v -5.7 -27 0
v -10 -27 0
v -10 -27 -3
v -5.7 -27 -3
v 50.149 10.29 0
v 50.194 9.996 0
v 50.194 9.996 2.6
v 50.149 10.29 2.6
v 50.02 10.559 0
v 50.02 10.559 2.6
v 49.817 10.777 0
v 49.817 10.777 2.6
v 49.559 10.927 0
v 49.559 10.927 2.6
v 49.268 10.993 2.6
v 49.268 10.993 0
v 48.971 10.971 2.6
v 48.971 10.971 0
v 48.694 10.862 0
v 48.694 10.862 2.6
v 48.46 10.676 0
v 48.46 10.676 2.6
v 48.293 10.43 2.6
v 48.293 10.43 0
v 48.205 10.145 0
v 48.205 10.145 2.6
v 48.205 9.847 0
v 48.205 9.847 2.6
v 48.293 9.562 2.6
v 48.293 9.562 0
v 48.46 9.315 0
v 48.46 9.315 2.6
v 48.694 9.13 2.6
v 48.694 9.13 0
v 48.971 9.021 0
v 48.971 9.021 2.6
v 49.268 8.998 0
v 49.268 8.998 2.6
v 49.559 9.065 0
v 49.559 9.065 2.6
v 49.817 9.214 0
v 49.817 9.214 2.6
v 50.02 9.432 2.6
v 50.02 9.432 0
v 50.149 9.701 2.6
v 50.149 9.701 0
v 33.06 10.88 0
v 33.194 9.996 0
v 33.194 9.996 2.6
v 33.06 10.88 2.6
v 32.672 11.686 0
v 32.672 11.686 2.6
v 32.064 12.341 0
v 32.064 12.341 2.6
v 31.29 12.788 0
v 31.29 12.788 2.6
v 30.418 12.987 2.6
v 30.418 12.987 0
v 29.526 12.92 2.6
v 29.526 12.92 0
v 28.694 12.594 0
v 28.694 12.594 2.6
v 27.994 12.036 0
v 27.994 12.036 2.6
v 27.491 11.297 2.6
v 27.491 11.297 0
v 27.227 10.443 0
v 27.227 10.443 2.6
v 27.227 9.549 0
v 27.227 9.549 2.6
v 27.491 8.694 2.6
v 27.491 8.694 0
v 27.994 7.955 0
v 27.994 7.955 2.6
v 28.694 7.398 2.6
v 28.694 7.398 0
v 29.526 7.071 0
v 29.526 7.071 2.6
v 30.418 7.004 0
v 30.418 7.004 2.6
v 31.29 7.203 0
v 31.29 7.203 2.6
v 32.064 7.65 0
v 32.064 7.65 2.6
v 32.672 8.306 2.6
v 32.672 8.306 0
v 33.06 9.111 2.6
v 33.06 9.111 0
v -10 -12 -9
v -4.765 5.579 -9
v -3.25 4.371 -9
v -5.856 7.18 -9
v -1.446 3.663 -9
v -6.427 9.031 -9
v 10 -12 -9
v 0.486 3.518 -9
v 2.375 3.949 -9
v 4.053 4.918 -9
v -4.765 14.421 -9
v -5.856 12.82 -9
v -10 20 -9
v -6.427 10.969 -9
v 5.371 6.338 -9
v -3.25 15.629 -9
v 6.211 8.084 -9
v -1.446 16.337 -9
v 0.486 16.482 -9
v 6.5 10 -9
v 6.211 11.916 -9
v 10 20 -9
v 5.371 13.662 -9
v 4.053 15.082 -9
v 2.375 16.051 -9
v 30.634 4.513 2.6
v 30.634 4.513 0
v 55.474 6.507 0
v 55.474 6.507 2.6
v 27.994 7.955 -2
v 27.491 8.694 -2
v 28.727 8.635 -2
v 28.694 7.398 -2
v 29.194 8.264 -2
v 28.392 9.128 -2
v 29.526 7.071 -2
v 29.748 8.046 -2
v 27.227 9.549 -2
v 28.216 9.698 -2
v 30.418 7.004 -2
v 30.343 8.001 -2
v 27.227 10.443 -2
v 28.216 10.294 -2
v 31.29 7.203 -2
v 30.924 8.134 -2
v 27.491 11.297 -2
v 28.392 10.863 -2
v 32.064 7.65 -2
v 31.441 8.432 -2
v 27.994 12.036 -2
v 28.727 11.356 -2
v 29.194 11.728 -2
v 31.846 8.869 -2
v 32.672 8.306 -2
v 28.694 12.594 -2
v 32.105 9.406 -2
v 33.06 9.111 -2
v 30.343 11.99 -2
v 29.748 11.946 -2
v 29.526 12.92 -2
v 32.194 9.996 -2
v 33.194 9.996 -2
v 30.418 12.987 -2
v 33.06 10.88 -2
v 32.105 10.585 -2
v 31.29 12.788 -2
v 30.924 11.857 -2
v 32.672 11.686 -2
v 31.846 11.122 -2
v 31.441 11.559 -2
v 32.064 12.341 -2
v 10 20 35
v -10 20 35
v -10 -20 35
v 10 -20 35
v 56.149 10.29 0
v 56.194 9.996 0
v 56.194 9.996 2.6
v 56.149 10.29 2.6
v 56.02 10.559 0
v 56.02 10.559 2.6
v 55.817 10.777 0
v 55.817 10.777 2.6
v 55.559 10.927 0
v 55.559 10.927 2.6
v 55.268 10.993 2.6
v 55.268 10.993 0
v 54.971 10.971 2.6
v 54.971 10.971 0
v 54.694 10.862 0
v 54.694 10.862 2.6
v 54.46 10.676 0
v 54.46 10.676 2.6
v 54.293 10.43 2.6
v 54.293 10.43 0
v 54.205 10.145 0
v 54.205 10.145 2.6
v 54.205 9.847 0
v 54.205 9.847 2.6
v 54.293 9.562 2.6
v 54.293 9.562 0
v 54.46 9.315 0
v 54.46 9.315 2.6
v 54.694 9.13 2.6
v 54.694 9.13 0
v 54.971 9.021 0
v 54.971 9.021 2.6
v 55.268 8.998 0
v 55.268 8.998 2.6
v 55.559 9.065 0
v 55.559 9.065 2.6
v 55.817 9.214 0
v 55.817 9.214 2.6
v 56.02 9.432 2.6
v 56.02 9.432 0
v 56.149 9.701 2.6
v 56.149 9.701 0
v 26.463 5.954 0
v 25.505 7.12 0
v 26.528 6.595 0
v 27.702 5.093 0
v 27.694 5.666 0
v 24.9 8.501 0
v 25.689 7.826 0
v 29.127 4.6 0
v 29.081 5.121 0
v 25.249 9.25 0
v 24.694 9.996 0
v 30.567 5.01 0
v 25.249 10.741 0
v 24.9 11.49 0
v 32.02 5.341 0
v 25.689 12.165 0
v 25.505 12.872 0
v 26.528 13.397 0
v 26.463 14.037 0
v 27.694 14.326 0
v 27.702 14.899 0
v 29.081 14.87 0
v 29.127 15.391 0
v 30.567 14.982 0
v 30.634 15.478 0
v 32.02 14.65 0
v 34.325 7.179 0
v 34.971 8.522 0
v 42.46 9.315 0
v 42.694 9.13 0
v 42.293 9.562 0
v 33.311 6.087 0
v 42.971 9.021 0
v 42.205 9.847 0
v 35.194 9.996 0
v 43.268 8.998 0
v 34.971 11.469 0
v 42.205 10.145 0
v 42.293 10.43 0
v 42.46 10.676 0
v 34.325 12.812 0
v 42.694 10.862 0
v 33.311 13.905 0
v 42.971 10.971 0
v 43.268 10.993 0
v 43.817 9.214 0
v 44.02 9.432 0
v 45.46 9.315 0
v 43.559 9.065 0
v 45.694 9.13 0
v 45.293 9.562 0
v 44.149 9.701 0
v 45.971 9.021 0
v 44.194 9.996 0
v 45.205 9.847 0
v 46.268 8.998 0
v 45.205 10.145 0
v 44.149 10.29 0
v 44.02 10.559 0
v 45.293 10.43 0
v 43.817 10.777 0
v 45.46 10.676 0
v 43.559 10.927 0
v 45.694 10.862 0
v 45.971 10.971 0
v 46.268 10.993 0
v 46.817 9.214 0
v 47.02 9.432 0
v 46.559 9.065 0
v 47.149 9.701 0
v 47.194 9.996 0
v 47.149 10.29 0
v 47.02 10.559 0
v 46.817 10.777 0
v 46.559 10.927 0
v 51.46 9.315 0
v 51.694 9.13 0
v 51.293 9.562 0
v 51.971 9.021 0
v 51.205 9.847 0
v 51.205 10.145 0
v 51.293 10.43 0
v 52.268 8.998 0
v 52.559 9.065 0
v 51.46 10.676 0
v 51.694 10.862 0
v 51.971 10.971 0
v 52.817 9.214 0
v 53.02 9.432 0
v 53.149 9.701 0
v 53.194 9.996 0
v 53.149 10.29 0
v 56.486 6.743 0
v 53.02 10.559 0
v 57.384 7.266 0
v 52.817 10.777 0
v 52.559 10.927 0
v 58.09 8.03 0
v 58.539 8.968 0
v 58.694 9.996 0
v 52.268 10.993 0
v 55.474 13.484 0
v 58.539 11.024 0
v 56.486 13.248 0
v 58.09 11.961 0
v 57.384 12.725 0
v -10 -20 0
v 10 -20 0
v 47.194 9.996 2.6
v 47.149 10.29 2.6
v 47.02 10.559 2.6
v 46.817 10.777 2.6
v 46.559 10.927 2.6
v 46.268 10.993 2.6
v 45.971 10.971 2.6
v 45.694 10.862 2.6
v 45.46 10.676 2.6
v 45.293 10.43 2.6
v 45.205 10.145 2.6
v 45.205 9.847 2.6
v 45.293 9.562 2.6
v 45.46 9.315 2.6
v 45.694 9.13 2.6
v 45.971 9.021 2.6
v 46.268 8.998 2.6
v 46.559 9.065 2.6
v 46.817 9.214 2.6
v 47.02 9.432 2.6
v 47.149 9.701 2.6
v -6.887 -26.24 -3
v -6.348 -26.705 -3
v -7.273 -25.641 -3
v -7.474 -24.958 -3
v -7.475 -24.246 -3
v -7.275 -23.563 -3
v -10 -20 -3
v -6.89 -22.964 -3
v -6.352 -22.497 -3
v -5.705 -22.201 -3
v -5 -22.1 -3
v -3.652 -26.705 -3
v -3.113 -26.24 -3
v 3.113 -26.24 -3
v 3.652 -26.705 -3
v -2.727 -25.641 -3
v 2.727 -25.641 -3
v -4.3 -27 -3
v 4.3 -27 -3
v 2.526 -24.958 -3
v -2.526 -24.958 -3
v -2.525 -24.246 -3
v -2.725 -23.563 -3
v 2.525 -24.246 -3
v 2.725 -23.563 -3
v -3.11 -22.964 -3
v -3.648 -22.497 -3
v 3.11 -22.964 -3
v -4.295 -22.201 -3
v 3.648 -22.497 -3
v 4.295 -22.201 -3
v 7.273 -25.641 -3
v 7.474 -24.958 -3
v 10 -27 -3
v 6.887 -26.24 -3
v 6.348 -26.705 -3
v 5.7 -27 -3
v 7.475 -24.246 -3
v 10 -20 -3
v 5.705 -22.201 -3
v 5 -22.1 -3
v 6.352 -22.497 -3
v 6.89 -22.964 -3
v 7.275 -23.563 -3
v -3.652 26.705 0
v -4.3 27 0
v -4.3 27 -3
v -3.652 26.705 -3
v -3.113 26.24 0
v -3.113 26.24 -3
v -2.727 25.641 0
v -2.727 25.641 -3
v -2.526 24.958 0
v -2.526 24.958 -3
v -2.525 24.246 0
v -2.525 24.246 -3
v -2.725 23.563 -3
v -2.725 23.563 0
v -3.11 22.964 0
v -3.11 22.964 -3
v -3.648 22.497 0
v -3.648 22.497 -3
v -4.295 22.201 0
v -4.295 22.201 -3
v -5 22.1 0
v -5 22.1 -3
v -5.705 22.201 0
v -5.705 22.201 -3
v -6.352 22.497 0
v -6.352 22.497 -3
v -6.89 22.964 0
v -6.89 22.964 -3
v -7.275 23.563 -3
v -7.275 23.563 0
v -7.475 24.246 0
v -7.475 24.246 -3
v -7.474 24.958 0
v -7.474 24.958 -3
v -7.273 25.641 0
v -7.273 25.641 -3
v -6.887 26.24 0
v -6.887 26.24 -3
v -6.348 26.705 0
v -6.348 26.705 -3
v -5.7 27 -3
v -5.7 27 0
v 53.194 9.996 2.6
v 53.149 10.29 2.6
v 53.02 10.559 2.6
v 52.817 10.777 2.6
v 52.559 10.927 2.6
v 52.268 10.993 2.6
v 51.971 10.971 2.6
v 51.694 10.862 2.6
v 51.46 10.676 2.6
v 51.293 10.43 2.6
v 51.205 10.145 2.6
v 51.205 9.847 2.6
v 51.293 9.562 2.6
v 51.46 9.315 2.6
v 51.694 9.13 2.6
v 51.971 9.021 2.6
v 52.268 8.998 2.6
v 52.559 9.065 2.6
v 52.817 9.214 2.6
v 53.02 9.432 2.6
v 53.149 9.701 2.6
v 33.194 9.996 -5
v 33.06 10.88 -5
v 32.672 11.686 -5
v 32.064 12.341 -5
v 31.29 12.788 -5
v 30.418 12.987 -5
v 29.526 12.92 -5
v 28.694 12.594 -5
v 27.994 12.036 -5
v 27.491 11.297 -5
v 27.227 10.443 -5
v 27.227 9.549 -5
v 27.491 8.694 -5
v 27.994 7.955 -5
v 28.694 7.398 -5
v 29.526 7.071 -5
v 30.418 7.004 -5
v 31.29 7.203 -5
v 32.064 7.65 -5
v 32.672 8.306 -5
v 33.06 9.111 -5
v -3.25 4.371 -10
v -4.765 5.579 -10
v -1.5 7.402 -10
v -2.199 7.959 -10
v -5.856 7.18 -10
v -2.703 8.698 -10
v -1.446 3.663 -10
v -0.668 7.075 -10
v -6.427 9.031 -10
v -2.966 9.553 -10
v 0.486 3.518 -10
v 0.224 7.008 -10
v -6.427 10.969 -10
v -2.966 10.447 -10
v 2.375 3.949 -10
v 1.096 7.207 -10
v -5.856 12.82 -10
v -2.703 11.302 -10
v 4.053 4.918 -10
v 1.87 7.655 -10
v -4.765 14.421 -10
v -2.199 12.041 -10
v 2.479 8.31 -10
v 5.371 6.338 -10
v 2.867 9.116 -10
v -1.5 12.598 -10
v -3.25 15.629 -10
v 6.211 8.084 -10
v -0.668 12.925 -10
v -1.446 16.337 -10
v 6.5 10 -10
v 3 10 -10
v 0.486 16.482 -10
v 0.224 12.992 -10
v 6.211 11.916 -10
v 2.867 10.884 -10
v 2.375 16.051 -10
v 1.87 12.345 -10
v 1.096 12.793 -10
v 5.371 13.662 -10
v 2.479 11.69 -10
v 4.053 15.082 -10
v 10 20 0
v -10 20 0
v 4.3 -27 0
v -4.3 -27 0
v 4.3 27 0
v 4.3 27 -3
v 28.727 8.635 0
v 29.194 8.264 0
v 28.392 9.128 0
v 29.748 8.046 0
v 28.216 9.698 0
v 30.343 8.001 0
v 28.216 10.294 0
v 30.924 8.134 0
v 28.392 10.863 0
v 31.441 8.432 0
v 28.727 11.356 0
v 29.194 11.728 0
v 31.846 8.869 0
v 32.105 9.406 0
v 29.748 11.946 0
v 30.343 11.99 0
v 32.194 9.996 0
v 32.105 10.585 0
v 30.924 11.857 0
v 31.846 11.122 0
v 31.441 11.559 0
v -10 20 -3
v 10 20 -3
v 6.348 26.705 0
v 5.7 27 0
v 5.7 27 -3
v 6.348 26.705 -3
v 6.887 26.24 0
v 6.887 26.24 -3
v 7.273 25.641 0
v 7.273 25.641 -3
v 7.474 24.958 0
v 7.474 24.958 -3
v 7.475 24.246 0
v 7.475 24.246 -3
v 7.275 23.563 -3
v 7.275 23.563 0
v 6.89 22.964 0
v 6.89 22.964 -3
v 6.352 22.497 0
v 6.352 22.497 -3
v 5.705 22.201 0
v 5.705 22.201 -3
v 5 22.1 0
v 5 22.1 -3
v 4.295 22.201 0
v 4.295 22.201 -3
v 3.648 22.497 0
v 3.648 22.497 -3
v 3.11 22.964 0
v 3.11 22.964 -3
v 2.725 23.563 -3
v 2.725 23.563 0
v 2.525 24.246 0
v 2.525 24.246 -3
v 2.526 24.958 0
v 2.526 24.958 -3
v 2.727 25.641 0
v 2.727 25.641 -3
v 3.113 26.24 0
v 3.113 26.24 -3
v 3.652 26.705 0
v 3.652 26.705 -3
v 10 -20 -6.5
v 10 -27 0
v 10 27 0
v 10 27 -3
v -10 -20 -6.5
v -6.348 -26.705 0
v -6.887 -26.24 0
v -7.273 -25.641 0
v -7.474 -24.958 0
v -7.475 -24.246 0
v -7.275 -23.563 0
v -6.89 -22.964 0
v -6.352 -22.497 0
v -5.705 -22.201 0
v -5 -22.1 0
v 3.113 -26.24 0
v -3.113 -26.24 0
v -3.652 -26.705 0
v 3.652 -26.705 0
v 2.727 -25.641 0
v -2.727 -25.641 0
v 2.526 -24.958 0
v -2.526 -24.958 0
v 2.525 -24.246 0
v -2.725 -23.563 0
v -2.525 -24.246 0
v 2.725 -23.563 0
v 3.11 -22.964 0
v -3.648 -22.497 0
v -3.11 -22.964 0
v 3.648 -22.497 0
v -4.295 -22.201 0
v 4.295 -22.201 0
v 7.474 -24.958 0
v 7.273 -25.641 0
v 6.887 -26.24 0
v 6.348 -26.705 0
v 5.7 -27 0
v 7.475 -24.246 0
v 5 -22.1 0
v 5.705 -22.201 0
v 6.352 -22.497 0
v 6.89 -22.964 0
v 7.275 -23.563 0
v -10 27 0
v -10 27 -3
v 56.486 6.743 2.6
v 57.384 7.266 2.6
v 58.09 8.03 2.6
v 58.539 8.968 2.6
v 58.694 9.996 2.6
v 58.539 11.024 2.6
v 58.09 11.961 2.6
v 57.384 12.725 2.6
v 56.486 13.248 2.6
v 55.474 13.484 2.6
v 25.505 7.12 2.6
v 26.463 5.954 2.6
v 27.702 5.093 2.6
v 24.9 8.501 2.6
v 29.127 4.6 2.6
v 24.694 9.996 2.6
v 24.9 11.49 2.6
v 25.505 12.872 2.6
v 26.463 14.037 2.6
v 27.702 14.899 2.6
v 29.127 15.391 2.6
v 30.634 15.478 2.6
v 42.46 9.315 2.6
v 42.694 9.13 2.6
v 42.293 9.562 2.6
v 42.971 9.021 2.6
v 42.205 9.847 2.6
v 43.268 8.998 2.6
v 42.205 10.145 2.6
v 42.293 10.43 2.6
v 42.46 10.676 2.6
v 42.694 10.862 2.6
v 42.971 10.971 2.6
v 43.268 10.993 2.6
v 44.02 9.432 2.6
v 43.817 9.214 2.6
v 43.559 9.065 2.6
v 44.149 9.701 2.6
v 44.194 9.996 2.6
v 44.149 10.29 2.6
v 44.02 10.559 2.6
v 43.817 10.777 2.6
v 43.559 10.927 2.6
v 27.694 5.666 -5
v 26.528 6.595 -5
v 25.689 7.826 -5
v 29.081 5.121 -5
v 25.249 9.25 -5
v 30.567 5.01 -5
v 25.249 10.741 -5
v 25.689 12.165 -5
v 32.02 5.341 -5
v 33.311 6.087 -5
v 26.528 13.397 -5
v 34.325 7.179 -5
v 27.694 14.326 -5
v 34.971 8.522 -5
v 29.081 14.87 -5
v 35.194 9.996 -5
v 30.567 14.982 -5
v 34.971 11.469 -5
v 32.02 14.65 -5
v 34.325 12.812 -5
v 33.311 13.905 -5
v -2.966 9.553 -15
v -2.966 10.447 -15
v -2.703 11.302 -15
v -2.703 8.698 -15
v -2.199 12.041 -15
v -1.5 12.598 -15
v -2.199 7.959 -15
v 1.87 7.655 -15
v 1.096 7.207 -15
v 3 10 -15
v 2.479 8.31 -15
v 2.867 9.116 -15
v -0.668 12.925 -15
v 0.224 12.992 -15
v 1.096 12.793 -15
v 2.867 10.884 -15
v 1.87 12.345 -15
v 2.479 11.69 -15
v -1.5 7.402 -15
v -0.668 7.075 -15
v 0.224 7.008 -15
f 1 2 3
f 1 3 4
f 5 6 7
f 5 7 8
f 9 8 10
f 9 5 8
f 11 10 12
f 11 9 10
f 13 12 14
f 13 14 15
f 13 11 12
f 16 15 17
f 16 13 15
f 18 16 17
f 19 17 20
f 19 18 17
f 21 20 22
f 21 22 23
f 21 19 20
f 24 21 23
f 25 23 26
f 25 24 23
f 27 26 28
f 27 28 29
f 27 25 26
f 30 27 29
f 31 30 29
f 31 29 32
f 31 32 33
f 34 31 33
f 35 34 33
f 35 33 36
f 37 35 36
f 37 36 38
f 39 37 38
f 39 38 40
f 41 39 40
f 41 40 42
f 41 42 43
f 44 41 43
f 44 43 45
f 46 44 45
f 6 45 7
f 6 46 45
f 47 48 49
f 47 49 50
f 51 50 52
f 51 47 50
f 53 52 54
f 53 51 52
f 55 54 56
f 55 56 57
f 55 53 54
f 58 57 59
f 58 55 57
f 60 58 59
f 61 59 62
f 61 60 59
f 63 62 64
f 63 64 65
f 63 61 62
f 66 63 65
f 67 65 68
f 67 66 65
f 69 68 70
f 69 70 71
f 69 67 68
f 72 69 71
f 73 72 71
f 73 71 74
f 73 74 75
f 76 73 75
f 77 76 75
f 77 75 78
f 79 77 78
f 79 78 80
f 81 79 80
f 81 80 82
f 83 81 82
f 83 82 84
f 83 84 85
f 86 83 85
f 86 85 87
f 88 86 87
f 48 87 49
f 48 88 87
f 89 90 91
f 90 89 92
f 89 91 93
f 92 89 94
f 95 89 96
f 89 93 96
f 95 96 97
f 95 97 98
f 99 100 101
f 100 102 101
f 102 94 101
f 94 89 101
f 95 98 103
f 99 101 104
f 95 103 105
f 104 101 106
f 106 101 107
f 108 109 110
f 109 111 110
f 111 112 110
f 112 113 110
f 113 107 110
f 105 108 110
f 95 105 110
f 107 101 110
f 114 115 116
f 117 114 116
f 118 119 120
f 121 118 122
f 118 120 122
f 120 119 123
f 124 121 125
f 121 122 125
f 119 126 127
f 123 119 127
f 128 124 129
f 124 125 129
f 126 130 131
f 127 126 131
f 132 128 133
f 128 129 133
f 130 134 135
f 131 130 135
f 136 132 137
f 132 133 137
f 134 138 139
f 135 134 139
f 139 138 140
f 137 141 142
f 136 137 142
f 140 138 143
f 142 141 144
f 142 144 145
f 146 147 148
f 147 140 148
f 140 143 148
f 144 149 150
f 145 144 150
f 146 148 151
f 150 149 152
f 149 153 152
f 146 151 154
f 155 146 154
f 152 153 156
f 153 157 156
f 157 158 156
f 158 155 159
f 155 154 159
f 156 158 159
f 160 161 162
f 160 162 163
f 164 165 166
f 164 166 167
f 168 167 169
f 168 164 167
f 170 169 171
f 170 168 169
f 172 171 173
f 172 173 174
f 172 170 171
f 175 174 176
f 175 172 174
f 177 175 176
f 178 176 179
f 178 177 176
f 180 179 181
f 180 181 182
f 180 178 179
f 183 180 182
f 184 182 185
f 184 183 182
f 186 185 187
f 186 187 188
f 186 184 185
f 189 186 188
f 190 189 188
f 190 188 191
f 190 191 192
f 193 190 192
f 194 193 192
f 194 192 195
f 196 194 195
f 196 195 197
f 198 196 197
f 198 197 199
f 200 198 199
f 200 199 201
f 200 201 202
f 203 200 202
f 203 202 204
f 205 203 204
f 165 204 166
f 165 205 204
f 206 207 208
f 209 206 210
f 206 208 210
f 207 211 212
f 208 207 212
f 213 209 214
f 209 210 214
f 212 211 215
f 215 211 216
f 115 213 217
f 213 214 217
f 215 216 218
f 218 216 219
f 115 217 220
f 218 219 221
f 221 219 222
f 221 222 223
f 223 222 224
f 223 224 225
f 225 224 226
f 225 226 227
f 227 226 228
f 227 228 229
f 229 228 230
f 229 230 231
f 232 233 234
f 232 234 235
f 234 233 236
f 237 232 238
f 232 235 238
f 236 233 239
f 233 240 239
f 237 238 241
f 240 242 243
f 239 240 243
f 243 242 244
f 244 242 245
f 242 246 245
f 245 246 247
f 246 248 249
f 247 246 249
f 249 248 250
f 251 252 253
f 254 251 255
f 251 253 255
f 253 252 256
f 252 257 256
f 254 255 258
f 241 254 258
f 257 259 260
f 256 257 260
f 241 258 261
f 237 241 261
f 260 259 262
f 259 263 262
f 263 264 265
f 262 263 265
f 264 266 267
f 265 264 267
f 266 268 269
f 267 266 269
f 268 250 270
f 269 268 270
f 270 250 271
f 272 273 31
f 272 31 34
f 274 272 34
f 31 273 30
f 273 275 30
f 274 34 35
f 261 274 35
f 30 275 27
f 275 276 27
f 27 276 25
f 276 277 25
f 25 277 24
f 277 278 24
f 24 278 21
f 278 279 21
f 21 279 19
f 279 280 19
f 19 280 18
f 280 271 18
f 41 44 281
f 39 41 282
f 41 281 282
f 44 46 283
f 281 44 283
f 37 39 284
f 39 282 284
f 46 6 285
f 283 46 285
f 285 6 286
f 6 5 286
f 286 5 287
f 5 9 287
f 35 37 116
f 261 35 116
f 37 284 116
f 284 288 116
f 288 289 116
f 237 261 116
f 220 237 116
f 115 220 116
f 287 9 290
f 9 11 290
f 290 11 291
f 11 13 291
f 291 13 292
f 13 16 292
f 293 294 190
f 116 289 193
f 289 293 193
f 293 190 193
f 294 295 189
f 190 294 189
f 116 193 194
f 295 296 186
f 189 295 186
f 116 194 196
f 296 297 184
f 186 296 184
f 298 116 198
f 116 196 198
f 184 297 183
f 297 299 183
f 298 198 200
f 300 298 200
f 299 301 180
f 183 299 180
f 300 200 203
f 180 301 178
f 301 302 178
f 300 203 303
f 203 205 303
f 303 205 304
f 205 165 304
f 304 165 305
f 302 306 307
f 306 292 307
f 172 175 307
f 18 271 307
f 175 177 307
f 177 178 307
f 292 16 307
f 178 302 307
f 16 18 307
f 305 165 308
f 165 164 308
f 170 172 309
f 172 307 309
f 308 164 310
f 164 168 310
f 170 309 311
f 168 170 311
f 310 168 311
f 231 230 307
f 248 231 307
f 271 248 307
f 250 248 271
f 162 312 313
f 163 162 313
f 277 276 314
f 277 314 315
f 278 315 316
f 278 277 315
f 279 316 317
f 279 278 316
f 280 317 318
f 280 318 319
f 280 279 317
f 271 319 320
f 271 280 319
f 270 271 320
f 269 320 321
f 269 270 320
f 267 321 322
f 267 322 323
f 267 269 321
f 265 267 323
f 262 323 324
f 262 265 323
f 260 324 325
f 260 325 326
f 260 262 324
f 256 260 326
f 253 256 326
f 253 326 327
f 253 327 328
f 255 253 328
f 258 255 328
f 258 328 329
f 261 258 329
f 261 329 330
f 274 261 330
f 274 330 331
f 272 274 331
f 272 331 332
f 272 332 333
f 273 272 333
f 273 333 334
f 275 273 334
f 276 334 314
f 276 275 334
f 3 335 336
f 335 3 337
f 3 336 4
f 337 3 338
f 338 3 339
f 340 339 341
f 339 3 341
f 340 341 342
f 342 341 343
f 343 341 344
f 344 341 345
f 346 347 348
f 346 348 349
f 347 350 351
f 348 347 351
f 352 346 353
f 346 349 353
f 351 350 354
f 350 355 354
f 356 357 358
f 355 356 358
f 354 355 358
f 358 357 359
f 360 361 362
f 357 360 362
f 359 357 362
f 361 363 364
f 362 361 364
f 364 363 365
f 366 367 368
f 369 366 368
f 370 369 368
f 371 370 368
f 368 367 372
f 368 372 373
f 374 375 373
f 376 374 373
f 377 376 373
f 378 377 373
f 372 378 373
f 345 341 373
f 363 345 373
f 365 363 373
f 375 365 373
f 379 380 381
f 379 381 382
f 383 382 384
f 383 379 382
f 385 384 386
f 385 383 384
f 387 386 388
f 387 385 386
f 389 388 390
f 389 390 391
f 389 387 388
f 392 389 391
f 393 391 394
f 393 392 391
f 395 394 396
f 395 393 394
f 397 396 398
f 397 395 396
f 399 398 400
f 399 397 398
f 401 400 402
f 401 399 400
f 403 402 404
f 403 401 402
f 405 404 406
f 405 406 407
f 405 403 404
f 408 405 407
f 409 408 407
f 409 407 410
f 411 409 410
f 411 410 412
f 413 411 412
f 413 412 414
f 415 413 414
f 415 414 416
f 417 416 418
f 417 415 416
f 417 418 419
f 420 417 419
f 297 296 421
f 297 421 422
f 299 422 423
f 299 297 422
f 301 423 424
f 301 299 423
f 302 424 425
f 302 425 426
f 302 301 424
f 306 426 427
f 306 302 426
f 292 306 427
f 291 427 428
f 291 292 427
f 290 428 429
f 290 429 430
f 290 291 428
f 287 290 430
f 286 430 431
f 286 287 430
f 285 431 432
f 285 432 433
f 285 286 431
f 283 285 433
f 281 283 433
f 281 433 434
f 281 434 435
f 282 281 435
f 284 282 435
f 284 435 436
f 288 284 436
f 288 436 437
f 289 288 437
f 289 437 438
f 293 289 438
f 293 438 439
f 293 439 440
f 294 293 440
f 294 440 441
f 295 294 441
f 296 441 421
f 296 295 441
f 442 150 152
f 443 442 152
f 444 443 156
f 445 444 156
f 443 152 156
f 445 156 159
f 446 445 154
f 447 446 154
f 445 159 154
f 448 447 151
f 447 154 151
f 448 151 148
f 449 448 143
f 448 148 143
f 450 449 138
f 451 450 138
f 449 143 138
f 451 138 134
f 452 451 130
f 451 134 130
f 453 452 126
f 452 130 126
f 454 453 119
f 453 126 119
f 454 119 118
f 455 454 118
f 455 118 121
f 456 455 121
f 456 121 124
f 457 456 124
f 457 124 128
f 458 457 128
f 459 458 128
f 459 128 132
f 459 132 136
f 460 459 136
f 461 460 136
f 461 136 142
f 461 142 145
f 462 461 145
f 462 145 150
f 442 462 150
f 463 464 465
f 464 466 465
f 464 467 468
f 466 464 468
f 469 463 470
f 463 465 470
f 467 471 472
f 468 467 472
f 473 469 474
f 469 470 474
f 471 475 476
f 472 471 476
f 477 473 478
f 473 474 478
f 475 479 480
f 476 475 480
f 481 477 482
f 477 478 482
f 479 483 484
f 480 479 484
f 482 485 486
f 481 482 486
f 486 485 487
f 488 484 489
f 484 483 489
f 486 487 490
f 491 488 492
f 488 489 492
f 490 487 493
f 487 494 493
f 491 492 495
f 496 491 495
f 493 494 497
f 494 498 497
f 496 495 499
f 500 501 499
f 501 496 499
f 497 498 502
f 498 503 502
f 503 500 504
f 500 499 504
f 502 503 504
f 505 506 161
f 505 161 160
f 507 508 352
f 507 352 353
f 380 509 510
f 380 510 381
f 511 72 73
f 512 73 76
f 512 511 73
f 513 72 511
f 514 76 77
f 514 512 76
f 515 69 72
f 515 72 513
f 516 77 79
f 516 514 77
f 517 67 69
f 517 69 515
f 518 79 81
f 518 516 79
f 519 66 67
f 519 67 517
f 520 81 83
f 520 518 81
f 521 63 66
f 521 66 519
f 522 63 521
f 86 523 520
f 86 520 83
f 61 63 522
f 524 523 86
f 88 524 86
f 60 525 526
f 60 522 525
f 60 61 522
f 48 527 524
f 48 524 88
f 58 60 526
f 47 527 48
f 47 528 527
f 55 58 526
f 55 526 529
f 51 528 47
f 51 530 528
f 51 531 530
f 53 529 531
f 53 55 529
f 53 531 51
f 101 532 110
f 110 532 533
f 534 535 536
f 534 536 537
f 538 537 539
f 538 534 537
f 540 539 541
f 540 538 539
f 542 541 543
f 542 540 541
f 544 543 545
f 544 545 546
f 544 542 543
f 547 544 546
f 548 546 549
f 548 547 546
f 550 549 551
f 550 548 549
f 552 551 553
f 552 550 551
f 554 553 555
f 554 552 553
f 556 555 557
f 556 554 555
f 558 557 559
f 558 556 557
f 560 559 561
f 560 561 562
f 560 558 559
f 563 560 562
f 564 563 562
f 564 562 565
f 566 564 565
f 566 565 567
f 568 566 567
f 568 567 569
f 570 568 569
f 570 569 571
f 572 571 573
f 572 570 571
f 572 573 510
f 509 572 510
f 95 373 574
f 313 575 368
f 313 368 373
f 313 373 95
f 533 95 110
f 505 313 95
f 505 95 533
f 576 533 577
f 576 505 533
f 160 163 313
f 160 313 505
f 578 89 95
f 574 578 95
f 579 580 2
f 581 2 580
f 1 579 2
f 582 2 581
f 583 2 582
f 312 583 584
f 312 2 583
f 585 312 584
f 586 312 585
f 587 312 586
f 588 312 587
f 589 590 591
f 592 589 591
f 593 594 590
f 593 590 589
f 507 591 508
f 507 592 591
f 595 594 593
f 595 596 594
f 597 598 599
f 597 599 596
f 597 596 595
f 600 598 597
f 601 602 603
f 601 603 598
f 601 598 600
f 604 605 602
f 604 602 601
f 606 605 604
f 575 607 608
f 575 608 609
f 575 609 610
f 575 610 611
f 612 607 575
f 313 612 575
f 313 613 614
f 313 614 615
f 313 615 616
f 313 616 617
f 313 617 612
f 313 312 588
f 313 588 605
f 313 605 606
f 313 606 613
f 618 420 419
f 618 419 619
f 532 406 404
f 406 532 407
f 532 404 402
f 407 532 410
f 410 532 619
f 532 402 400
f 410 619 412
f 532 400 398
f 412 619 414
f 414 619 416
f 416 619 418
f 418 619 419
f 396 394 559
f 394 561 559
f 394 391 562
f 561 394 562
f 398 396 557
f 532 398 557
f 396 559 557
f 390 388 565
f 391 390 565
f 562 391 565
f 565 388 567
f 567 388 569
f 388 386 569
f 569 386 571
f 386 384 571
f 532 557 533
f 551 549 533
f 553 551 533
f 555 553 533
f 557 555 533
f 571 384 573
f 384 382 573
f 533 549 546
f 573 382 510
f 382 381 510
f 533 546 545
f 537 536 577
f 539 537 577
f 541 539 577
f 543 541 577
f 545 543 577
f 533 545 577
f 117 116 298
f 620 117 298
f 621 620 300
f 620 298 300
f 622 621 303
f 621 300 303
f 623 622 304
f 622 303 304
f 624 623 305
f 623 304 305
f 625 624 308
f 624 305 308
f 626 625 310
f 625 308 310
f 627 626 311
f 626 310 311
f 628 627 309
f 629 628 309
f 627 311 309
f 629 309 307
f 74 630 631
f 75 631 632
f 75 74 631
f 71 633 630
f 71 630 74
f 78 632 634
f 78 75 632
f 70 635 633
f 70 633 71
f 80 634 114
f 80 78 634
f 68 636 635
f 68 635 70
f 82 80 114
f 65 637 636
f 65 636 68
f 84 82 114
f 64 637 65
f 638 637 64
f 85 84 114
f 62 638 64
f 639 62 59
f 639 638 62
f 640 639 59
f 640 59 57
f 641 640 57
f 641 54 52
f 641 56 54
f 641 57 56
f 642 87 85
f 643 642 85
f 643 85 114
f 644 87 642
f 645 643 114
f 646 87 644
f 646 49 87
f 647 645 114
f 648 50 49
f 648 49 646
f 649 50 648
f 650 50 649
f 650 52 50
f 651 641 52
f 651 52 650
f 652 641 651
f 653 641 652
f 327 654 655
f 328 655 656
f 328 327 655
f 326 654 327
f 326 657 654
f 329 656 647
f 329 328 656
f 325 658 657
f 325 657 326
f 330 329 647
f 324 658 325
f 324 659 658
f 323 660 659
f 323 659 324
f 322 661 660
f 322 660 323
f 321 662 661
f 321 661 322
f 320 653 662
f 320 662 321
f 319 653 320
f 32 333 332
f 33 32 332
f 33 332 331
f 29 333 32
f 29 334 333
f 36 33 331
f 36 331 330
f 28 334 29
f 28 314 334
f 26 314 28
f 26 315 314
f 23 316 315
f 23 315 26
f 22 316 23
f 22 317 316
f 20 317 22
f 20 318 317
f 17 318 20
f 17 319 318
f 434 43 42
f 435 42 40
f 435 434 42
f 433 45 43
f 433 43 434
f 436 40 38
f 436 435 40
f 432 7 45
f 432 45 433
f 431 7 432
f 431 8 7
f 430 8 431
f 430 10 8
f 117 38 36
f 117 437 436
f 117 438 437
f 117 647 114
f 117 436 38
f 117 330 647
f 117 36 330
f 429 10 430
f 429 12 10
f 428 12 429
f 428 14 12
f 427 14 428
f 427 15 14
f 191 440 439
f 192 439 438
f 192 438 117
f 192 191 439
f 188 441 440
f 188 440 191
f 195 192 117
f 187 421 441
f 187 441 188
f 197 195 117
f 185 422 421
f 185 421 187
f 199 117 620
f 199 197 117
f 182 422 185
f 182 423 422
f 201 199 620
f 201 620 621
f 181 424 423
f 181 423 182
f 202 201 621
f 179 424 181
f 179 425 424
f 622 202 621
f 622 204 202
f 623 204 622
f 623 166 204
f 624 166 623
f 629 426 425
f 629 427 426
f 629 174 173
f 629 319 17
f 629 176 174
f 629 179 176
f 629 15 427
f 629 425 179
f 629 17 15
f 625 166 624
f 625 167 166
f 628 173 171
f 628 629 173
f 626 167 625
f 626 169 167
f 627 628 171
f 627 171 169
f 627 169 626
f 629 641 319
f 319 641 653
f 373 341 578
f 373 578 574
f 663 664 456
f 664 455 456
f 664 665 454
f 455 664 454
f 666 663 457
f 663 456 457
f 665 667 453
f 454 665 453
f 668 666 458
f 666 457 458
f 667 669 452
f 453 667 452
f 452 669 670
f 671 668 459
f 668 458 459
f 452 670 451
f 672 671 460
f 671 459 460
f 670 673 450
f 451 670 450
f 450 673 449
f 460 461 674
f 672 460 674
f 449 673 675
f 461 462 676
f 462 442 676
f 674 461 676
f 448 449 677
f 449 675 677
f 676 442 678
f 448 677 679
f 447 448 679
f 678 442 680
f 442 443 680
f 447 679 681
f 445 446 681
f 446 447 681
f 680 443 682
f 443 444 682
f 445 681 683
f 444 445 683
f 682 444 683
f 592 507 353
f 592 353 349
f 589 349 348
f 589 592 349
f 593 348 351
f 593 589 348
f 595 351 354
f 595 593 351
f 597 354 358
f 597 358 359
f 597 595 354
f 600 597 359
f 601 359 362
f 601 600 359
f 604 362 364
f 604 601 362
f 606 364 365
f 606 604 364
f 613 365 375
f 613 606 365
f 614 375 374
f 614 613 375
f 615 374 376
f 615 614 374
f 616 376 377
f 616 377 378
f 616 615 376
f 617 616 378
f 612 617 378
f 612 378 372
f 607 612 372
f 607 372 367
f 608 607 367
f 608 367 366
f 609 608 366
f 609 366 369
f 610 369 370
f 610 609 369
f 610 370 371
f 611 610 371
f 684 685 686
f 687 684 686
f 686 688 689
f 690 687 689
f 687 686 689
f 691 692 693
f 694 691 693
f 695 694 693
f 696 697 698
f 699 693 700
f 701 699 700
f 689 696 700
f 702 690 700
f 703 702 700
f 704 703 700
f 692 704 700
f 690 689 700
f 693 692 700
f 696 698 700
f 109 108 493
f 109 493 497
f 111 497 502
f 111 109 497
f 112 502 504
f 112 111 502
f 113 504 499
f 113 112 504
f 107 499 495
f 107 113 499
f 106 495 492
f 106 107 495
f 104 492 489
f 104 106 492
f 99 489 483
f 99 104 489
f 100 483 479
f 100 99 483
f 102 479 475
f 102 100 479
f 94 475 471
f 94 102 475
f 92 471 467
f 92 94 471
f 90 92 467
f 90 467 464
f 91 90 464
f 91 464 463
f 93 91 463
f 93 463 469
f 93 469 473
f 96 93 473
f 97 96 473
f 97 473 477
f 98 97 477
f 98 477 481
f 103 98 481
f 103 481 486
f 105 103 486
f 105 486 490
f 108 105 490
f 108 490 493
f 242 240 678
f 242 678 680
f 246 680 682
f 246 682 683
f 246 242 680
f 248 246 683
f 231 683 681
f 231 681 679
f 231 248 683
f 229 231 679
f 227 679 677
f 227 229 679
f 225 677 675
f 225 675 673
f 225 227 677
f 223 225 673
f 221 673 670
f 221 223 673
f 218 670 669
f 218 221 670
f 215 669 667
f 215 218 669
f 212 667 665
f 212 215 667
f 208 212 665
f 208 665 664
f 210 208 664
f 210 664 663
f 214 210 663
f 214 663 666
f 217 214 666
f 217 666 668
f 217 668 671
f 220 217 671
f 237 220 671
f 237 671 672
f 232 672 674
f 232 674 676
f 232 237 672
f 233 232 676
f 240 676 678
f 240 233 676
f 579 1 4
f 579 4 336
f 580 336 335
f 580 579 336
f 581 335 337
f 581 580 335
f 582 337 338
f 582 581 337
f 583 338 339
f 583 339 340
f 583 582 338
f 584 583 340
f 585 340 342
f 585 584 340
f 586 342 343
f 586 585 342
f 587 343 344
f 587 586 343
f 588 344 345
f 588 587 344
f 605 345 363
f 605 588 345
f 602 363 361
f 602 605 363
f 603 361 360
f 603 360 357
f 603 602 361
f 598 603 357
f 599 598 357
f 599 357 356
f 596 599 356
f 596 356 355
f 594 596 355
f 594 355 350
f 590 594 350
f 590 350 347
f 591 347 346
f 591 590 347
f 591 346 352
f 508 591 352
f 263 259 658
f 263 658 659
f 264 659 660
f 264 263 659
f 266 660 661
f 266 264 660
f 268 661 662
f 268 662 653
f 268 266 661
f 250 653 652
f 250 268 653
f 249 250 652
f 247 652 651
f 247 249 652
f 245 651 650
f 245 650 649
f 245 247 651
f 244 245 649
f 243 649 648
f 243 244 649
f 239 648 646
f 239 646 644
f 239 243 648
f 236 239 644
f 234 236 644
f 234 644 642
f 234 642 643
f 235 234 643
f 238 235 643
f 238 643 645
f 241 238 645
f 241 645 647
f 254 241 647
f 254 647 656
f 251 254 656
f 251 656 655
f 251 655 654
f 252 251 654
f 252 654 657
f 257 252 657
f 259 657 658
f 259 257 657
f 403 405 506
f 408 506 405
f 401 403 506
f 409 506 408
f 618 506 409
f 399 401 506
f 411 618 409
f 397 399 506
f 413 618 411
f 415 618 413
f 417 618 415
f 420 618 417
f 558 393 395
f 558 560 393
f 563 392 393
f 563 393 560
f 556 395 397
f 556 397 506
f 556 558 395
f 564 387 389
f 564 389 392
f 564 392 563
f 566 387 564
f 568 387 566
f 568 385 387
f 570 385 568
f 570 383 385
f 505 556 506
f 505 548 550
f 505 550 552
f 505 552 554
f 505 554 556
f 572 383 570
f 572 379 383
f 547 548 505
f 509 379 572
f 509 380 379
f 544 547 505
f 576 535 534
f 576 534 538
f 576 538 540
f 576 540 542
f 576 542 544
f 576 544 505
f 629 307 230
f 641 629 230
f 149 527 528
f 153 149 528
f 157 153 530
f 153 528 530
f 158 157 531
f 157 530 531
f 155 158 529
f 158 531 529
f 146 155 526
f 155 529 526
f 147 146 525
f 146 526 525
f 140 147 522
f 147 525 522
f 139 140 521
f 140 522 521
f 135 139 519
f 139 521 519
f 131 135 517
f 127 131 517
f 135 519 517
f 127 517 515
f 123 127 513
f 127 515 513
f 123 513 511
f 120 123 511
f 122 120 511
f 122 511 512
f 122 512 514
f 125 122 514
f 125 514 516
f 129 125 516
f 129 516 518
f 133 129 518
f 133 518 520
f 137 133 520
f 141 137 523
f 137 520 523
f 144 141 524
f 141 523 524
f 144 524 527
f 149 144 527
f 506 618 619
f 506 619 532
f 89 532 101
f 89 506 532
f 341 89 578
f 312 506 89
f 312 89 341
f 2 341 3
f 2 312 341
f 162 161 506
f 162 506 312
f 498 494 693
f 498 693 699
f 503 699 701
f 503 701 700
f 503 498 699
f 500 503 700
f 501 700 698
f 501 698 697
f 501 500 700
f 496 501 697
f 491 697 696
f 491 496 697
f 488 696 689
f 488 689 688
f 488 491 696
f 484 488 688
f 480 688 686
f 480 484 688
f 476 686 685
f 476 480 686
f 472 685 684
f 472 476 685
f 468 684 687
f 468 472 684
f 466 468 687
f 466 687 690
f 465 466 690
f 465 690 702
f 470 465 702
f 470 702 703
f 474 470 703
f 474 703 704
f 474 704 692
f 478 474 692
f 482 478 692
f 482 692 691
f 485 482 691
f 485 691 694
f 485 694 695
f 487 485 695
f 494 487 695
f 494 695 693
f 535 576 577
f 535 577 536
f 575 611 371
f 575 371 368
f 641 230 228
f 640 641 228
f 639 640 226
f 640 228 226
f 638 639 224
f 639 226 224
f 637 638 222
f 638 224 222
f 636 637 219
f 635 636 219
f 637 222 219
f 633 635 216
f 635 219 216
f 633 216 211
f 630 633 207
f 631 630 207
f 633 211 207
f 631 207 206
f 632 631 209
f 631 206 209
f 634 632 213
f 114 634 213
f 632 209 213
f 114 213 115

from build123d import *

# Parameters (mm, degrees)
F0_W     = 20
F0_H     = 40
F0_R     = 6.5
F0_R_2   = 3
F1_DEPTH = 35
F2_DEPTH = 9
F3_DEPTH = 3
F4_SIZE2 = 8
F4_SIZE  = 2.5
F5_DEPTH = 10
F6_DEPTH = 15
F0_R_3   = 5
F0_R_4   = 1
F7_DEPTH = 2.6
F8_DEPTH = 5
F0_R_5   = 2
F9_DEPTH = 2


with BuildPart() as f1:
    # F0 (on Top) → F1 (new body)
    with BuildSketch(Plane.XY):
        Rectangle(F0_W, F0_H)
        with Locations((0, 10)):
            Circle(F0_R, mode=Mode.SUBTRACT)
        with Locations((0, 10)):
            Circle(F0_R)
        with Locations((0, 10)):
            Circle(F0_R_2, mode=Mode.SUBTRACT)
        with Locations((0, 10)):
            Circle(F0_R_2)
    extrude(amount=F1_DEPTH)

    # F0 (on Top) → F2 (join)
    with BuildSketch(Plane.XY):
        Rectangle(F0_W, F0_H)
        with Locations((0, 10)):
            Circle(F0_R, mode=Mode.SUBTRACT)
        with Locations((0, 10)):
            Circle(F0_R_2)
        with Locations((0, 10)):
            Circle(F0_R)
        with Locations((0, 10)):
            Circle(F0_R_2, mode=Mode.SUBTRACT)
    extrude(amount=-F2_DEPTH)

    # F0 (on Top) → F3 (join)
    with BuildSketch(Plane.XY):
        with BuildLine():
            Line((-10, 27), (-10, 20))
            Line((-10, 20), (10, 20))
            Line((10, 20), (10, 27))
            Line((10, 27), (5.7, 27))
            ThreePointArc((5.7, 27), (7, 26.1), (7.5, 24.6))
            ThreePointArc((7.5, 24.6), (3.5, 22.6), (4.3, 27))
            Line((4.3, 27), (-4.3, 27))
            ThreePointArc((-4.3, 27), (-3, 26.1), (-2.5, 24.6))
            ThreePointArc((-2.5, 24.6), (-6.5, 22.6), (-5.7, 27))
            Line((-5.7, 27), (-10, 27))
        make_face()
        with BuildLine():
            Line((10, -20), (-10, -20))
            Line((-10, -20), (-10, -27))
            Line((-10, -27), (-5.7, -27))
            ThreePointArc((-5.7, -27), (-6.5, -22.6), (-2.5, -24.6))
            ThreePointArc((-2.5, -24.6), (-3, -26.1), (-4.3, -27))
            Line((-4.3, -27), (4.3, -27))
            ThreePointArc((4.3, -27), (3.5, -22.6), (7.5, -24.6))
            ThreePointArc((7.5, -24.6), (7, -26.1), (5.7, -27))
            Line((5.7, -27), (10, -27))
            Line((10, -27), (10, -20))
        make_face()
        Rectangle(F0_W, F0_H)
        with Locations((0, 10)):
            Circle(F0_R, mode=Mode.SUBTRACT)
        with Locations((0, 10)):
            Circle(F0_R)
        with Locations((0, 10)):
            Circle(F0_R_2, mode=Mode.SUBTRACT)
        with Locations((0, 10)):
            Circle(F0_R_2)
    extrude(amount=-F3_DEPTH)

    # F4
    f4_edges = [f1.edges().sort_by_distance(p)[0] for p in [
        (0, -20, -9),
    ]]
    chamfer(f4_edges, length=F4_SIZE, length2=F4_SIZE2)

    # F0 (on Top) → F5 (join)
    with BuildSketch(Plane.XY):
        with Locations((0, 10)):
            Circle(F0_R)
        with Locations((0, 10)):
            Circle(F0_R_2, mode=Mode.SUBTRACT)
    extrude(amount=-F5_DEPTH)

    # F0 (on Top) → F6 (join)
    with BuildSketch(Plane.XY):
        with Locations((0, 10)):
            Circle(F0_R_2)
    extrude(amount=-F6_DEPTH)


with BuildPart() as f7:
    # F0 (on Top) → F7 (new body)
    with BuildSketch(Plane.XY):
        with BuildLine():
            Line((55.473526, 13.48445), (30.633526, 15.47804))
            ThreePointArc((30.633526, 15.47804), (24.693526, 9.995668), (30.633526, 4.513296))
            Line((30.633526, 4.513296), (55.473526, 6.506886))
            ThreePointArc((55.473526, 6.506886), (58.693526, 9.995668), (55.473526, 13.48445))
        make_face()
        with Locations((30.193526, 9.995668)):
            Circle(F0_R_3, mode=Mode.SUBTRACT)
        with Locations((43.193526, 9.995668)):
            Circle(F0_R_4, mode=Mode.SUBTRACT)
        with Locations((46.193526, 9.995668)):
            Circle(F0_R_4, mode=Mode.SUBTRACT)
        with Locations((49.193526, 9.995668)):
            Circle(F0_R_4, mode=Mode.SUBTRACT)
        with Locations((52.193526, 9.995668)):
            Circle(F0_R_4, mode=Mode.SUBTRACT)
        with Locations((55.193526, 9.995668)):
            Circle(F0_R_4, mode=Mode.SUBTRACT)
        with Locations((30.193526, 9.995668)):
            Circle(F0_R_3)
        with Locations((30.193526, 9.995668)):
            Circle(F0_R_2, mode=Mode.SUBTRACT)
    extrude(amount=F7_DEPTH)

    # F0 (on Top) → F8 (join)
    with BuildSketch(Plane.XY):
        with Locations((30.193526, 9.995668)):
            Circle(F0_R_3)
        with Locations((30.193526, 9.995668)):
            Circle(F0_R_2, mode=Mode.SUBTRACT)
    extrude(amount=-F8_DEPTH)

    # F0 (on Top) → F9 (join)
    with BuildSketch(Plane.XY):
        with Locations((30.193526, 9.995668)):
            Circle(F0_R_2)
        with Locations((30.193526, 9.995668)):
            Circle(F0_R_5, mode=Mode.SUBTRACT)
    extrude(amount=-F9_DEPTH)


solid = Compound([f1.part, f7.part])
